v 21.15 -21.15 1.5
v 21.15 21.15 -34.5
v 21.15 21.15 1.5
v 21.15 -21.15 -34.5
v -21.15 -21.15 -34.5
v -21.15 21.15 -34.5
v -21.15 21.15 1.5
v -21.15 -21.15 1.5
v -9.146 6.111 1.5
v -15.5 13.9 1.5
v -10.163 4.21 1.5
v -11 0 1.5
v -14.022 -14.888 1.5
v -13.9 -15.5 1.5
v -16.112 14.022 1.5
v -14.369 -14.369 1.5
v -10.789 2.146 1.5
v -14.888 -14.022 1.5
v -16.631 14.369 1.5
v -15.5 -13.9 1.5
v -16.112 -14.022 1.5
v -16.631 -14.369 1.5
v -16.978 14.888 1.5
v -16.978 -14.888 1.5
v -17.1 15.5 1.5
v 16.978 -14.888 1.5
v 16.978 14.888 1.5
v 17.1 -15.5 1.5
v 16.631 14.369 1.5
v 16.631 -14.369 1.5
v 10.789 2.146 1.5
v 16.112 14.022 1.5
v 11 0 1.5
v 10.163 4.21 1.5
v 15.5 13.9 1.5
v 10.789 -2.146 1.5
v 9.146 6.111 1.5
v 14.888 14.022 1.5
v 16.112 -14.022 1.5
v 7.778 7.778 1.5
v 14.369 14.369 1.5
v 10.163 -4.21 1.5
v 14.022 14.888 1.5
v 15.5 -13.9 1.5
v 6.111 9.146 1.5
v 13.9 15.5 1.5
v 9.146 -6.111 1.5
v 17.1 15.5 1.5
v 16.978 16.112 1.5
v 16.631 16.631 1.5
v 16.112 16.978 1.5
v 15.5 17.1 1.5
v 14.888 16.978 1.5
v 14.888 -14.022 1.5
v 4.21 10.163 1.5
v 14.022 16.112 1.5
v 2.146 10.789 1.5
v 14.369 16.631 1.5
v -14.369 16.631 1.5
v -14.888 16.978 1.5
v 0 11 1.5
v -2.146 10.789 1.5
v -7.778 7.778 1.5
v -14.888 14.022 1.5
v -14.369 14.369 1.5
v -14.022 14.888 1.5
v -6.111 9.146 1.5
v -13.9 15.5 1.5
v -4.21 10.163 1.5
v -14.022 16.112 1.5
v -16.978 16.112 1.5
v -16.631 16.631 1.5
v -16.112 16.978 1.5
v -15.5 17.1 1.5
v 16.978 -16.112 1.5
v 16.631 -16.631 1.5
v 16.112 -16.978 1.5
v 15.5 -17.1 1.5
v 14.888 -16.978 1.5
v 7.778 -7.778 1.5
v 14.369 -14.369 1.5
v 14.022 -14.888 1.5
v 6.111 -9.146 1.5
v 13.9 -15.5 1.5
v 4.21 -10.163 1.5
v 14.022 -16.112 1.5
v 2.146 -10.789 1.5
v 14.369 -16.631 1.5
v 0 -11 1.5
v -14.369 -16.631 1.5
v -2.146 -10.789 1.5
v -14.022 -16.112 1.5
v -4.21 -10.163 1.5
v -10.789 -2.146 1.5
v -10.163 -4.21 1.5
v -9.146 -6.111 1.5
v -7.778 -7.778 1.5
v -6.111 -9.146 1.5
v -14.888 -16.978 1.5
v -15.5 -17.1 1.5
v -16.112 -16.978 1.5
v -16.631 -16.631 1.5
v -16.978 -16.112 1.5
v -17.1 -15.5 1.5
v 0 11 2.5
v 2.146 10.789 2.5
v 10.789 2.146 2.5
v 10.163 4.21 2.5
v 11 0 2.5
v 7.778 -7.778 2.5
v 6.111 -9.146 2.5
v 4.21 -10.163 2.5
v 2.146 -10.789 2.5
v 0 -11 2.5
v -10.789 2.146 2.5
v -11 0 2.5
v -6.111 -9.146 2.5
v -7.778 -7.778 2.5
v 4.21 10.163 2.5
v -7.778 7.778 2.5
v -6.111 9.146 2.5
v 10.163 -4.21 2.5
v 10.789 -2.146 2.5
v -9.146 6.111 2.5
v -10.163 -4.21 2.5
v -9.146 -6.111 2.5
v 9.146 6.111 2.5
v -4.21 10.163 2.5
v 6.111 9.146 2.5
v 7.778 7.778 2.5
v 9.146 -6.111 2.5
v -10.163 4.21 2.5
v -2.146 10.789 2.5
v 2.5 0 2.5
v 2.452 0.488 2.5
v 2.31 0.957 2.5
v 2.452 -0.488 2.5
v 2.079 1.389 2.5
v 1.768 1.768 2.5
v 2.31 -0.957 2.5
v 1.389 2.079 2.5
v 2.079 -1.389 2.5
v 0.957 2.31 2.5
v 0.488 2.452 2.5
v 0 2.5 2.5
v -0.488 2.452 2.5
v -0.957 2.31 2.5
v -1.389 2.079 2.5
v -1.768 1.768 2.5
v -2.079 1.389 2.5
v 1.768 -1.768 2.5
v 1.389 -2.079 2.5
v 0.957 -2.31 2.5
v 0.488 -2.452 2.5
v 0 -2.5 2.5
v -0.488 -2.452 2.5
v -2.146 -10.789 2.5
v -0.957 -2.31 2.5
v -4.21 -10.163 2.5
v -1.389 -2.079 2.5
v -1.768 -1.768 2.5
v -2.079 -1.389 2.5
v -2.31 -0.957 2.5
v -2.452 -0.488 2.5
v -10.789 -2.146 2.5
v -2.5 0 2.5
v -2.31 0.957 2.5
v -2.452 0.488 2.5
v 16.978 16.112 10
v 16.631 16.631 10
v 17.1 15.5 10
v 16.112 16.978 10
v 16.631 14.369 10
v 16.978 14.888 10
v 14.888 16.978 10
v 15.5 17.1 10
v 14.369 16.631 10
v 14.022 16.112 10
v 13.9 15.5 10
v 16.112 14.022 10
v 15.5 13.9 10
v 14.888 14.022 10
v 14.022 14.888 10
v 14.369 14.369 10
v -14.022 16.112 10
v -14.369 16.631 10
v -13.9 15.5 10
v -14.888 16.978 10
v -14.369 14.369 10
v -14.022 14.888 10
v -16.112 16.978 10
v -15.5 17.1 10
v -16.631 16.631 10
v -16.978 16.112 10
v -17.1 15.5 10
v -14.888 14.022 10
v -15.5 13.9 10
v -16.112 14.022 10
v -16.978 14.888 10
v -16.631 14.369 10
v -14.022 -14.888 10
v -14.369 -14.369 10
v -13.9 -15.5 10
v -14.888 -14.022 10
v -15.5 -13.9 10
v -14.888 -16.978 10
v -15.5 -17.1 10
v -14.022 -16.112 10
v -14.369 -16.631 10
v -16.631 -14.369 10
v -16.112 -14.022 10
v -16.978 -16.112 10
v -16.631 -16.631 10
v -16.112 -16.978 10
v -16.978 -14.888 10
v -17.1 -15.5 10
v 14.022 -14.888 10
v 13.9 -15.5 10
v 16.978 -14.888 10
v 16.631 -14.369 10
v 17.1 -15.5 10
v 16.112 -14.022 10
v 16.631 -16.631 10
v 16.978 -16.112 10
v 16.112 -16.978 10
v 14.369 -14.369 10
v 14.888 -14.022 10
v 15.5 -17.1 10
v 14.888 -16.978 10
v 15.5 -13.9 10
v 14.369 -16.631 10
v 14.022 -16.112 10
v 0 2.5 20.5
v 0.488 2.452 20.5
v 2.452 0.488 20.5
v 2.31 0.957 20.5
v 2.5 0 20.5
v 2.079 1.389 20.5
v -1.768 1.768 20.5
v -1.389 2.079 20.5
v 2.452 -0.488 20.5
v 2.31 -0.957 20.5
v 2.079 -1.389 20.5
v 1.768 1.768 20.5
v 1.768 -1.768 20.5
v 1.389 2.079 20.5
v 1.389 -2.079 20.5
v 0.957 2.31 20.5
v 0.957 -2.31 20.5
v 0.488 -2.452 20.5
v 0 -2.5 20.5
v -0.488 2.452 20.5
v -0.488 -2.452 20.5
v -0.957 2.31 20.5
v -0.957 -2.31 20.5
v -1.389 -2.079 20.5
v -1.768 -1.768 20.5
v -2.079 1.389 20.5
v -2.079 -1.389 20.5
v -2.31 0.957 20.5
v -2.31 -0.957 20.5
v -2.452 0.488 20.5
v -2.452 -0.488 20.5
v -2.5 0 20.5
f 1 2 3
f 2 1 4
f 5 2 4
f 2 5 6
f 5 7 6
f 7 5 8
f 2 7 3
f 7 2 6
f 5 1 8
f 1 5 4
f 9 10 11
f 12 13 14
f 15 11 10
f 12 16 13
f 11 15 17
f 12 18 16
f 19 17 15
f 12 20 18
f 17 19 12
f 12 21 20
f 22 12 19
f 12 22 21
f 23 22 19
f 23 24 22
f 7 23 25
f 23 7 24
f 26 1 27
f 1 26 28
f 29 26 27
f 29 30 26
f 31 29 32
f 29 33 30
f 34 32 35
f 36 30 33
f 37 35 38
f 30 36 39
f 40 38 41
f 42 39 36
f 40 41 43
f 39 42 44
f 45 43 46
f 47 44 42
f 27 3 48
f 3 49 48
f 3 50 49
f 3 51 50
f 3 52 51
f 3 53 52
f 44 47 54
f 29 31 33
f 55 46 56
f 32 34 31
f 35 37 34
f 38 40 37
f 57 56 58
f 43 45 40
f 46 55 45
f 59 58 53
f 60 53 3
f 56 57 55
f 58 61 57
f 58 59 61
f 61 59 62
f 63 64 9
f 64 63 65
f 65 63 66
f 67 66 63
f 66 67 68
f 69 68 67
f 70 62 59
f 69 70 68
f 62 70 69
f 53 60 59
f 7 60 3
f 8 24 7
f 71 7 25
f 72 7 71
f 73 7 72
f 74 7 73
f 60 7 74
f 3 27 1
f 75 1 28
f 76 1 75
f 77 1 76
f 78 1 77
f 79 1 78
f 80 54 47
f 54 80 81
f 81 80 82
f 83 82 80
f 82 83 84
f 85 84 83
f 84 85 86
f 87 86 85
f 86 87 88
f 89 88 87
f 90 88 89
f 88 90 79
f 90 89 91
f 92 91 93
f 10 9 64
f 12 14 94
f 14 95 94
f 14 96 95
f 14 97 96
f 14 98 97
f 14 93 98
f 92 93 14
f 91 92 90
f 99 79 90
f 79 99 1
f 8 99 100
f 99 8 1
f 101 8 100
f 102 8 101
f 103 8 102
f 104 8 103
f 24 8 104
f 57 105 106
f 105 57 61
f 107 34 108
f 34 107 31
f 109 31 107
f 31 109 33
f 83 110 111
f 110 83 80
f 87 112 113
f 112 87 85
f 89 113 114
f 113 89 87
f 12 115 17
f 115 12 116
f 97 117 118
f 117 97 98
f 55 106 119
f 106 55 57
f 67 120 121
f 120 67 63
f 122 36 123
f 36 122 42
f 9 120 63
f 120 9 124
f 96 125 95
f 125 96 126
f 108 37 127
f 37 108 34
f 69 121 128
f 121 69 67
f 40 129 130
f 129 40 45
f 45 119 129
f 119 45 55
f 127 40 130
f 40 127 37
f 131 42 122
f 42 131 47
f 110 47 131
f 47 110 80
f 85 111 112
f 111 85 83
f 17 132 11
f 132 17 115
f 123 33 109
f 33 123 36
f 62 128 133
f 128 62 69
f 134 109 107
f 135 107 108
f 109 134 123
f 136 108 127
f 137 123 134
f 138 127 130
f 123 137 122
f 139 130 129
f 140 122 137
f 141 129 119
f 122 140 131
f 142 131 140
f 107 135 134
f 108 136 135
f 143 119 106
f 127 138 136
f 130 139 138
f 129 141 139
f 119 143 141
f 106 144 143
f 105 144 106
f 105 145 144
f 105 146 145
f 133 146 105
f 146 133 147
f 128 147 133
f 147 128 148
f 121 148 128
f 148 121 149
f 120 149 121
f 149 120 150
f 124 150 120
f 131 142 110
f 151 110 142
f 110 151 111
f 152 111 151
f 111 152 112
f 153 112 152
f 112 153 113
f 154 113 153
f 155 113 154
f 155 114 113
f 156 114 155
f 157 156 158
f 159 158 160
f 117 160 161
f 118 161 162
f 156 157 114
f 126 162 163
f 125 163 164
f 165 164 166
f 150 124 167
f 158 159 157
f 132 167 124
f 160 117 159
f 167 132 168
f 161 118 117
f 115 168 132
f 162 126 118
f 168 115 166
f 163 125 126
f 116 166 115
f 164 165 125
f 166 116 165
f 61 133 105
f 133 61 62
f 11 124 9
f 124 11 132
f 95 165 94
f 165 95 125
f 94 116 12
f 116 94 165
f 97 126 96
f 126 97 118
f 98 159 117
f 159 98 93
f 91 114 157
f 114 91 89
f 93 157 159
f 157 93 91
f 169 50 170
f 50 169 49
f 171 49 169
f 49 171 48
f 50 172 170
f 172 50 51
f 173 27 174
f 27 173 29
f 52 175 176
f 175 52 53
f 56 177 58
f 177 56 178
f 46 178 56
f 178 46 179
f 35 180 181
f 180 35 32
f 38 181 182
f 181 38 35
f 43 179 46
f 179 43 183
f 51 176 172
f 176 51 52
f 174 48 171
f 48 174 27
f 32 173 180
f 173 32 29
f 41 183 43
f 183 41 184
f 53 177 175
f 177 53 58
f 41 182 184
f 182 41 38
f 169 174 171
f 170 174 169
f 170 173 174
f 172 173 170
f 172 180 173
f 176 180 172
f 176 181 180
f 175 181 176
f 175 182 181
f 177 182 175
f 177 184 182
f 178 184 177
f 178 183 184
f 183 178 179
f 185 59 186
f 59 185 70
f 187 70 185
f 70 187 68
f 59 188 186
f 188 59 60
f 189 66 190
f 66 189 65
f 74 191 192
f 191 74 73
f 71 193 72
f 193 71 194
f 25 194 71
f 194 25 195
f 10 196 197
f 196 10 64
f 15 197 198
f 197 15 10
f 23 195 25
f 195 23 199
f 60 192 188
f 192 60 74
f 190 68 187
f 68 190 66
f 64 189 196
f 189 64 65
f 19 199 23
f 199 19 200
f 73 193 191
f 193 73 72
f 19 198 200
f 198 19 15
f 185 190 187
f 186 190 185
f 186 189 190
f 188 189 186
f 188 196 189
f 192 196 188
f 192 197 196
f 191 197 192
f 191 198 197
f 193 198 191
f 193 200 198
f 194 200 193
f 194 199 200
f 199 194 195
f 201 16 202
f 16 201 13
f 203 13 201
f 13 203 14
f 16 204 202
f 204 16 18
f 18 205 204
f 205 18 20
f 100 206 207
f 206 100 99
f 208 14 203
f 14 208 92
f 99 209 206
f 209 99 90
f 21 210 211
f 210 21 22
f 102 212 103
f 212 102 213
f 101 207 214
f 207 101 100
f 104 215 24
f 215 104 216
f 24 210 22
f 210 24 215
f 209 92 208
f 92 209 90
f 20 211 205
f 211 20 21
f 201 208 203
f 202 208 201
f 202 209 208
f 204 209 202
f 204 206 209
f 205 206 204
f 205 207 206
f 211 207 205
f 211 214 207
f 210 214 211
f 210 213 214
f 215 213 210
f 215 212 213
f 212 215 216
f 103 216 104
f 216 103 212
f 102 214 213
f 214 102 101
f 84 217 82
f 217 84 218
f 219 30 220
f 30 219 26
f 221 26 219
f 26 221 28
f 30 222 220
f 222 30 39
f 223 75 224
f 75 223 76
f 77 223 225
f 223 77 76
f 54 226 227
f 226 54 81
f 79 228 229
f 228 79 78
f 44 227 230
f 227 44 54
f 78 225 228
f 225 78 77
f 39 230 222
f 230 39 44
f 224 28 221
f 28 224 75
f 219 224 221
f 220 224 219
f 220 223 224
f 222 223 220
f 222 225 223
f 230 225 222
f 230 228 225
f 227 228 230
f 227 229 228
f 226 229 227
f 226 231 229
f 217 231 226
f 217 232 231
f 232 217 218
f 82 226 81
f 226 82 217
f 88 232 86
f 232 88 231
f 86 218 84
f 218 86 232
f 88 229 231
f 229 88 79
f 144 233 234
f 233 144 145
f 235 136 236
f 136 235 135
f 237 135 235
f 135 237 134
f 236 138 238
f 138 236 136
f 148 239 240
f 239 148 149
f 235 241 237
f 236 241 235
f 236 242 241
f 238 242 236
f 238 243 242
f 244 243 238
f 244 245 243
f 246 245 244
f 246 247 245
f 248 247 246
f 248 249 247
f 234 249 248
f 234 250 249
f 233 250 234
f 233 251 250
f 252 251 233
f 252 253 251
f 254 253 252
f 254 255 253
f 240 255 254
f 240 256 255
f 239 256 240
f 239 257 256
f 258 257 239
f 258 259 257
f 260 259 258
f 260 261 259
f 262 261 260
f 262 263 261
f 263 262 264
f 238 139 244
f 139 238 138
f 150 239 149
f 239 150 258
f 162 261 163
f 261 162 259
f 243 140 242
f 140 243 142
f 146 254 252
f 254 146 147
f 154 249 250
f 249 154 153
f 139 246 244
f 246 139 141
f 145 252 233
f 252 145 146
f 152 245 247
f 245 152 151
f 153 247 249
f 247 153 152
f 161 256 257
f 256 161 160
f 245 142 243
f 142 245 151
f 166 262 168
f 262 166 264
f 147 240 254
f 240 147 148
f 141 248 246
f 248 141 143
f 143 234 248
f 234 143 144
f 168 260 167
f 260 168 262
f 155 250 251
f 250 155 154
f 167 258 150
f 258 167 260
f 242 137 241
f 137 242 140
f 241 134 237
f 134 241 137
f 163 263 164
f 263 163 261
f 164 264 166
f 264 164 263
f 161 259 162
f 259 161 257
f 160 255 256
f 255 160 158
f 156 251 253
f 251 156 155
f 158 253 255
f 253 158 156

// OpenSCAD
// Parameters
face_width = 42.3; //[21.15:84.6:0.1]
body_length = 34.0; //[17.0:68.0:0.5]
body_width = 42.3; //[21.15:84.6:0.1]
body_height = 42.3; //[21.15:84.6:0.1]
front_face_thickness = 3.0; //[1.5:6.0:0.1]
shaft_diameter = 5.0; //[2.5:10.0:0.1]
shaft_length = 20.0; //[10.0:40.0:0.5]
shaft_offset_from_face = 0.0; //[-2.0:5.0:0.1]
mount_hole_spacing = 31.0; //[15.5:62.0:0.1]
mount_hole_diameter = 3.2; //[2.0:6.0:0.1]
front_register_diameter = 22.0; //[11.0:44.0:0.1]
front_register_height = 2.0; //[1.0:5.0:0.1]
hole_depth = 20.0; //[10.0:60.0:1.0]

// Motor Shaft
module motor_shaft() {
  color("Silver") {
    translate([0, 0, front_face_thickness/2 + shaft_length/2 - 1 + shaft_offset_from_face])
      cylinder(r=shaft_diameter/2, h=shaft_length, center=true, $fn=32);
  }
}

// Ttrack Hole Positions
module ttrack_hole_positions() {
  // Placeholder for detailed geometry
  color("Red") {
    translate([0, 0, 0])
      sphere(r=0.001, center=true);
  }
}

// Ttrack Insert Hole Positions
module ttrack_insert_hole_positions() {
  // Placeholder for detailed geometry
  color("Green") {
    translate([0, 0, 0])
      sphere(r=0.001, center=true);
  }
}

// Rail Hole Positions
module rail_hole_positions() {
  // Placeholder for detailed geometry
  color("Blue") {
    translate([0, 0, 0])
      sphere(r=0.001, center=true);
  }
}

// Grill Hole Positions
module grill_hole_positions() {
  // Placeholder for detailed geometry
  color("Yellow") {
    translate([0, 0, 0])
      sphere(r=0.001, center=true);
  }
}

// NEMA Motor Assembly
module NEMA_motor() {
  color("Black") {
    // Motor Body
    translate([0, 0, -(front_face_thickness/2 + body_length/2 - 1)])
      cube([body_width, body_height, body_length], center=true);
    
    // Front Face
    translate([0, 0, 0])
      cube([face_width, face_width, front_face_thickness], center=true);
    
    // Front Register
    translate([0, 0, front_face_thickness/2 + front_register_height/2 - 1])
      cylinder(r=front_register_diameter/2, h=front_register_height, center=true, $fn=32);
  }
  
  // Mounting Holes
  color("DimGray") {
    translate([mount_hole_spacing/2, mount_hole_spacing/2, 0])
      cylinder(r=mount_hole_diameter/2, h=hole_depth, center=true, $fn=16);
    translate([-mount_hole_spacing/2, mount_hole_spacing/2, 0])
      cylinder(r=mount_hole_diameter/2, h=hole_depth, center=true, $fn=16);
    translate([-mount_hole_spacing/2, -mount_hole_spacing/2, 0])
      cylinder(r=mount_hole_diameter/2, h=hole_depth, center=true, $fn=16);
    translate([mount_hole_spacing/2, -mount_hole_spacing/2, 0])
      cylinder(r=mount_hole_diameter/2, h=hole_depth, center=true, $fn=16);
  }
}

// Assembly
module assembly() {
  NEMA_motor();
  motor_shaft();
  ttrack_hole_positions();
  ttrack_insert_hole_positions();
  rail_hole_positions();
  grill_hole_positions();
}

assembly();
